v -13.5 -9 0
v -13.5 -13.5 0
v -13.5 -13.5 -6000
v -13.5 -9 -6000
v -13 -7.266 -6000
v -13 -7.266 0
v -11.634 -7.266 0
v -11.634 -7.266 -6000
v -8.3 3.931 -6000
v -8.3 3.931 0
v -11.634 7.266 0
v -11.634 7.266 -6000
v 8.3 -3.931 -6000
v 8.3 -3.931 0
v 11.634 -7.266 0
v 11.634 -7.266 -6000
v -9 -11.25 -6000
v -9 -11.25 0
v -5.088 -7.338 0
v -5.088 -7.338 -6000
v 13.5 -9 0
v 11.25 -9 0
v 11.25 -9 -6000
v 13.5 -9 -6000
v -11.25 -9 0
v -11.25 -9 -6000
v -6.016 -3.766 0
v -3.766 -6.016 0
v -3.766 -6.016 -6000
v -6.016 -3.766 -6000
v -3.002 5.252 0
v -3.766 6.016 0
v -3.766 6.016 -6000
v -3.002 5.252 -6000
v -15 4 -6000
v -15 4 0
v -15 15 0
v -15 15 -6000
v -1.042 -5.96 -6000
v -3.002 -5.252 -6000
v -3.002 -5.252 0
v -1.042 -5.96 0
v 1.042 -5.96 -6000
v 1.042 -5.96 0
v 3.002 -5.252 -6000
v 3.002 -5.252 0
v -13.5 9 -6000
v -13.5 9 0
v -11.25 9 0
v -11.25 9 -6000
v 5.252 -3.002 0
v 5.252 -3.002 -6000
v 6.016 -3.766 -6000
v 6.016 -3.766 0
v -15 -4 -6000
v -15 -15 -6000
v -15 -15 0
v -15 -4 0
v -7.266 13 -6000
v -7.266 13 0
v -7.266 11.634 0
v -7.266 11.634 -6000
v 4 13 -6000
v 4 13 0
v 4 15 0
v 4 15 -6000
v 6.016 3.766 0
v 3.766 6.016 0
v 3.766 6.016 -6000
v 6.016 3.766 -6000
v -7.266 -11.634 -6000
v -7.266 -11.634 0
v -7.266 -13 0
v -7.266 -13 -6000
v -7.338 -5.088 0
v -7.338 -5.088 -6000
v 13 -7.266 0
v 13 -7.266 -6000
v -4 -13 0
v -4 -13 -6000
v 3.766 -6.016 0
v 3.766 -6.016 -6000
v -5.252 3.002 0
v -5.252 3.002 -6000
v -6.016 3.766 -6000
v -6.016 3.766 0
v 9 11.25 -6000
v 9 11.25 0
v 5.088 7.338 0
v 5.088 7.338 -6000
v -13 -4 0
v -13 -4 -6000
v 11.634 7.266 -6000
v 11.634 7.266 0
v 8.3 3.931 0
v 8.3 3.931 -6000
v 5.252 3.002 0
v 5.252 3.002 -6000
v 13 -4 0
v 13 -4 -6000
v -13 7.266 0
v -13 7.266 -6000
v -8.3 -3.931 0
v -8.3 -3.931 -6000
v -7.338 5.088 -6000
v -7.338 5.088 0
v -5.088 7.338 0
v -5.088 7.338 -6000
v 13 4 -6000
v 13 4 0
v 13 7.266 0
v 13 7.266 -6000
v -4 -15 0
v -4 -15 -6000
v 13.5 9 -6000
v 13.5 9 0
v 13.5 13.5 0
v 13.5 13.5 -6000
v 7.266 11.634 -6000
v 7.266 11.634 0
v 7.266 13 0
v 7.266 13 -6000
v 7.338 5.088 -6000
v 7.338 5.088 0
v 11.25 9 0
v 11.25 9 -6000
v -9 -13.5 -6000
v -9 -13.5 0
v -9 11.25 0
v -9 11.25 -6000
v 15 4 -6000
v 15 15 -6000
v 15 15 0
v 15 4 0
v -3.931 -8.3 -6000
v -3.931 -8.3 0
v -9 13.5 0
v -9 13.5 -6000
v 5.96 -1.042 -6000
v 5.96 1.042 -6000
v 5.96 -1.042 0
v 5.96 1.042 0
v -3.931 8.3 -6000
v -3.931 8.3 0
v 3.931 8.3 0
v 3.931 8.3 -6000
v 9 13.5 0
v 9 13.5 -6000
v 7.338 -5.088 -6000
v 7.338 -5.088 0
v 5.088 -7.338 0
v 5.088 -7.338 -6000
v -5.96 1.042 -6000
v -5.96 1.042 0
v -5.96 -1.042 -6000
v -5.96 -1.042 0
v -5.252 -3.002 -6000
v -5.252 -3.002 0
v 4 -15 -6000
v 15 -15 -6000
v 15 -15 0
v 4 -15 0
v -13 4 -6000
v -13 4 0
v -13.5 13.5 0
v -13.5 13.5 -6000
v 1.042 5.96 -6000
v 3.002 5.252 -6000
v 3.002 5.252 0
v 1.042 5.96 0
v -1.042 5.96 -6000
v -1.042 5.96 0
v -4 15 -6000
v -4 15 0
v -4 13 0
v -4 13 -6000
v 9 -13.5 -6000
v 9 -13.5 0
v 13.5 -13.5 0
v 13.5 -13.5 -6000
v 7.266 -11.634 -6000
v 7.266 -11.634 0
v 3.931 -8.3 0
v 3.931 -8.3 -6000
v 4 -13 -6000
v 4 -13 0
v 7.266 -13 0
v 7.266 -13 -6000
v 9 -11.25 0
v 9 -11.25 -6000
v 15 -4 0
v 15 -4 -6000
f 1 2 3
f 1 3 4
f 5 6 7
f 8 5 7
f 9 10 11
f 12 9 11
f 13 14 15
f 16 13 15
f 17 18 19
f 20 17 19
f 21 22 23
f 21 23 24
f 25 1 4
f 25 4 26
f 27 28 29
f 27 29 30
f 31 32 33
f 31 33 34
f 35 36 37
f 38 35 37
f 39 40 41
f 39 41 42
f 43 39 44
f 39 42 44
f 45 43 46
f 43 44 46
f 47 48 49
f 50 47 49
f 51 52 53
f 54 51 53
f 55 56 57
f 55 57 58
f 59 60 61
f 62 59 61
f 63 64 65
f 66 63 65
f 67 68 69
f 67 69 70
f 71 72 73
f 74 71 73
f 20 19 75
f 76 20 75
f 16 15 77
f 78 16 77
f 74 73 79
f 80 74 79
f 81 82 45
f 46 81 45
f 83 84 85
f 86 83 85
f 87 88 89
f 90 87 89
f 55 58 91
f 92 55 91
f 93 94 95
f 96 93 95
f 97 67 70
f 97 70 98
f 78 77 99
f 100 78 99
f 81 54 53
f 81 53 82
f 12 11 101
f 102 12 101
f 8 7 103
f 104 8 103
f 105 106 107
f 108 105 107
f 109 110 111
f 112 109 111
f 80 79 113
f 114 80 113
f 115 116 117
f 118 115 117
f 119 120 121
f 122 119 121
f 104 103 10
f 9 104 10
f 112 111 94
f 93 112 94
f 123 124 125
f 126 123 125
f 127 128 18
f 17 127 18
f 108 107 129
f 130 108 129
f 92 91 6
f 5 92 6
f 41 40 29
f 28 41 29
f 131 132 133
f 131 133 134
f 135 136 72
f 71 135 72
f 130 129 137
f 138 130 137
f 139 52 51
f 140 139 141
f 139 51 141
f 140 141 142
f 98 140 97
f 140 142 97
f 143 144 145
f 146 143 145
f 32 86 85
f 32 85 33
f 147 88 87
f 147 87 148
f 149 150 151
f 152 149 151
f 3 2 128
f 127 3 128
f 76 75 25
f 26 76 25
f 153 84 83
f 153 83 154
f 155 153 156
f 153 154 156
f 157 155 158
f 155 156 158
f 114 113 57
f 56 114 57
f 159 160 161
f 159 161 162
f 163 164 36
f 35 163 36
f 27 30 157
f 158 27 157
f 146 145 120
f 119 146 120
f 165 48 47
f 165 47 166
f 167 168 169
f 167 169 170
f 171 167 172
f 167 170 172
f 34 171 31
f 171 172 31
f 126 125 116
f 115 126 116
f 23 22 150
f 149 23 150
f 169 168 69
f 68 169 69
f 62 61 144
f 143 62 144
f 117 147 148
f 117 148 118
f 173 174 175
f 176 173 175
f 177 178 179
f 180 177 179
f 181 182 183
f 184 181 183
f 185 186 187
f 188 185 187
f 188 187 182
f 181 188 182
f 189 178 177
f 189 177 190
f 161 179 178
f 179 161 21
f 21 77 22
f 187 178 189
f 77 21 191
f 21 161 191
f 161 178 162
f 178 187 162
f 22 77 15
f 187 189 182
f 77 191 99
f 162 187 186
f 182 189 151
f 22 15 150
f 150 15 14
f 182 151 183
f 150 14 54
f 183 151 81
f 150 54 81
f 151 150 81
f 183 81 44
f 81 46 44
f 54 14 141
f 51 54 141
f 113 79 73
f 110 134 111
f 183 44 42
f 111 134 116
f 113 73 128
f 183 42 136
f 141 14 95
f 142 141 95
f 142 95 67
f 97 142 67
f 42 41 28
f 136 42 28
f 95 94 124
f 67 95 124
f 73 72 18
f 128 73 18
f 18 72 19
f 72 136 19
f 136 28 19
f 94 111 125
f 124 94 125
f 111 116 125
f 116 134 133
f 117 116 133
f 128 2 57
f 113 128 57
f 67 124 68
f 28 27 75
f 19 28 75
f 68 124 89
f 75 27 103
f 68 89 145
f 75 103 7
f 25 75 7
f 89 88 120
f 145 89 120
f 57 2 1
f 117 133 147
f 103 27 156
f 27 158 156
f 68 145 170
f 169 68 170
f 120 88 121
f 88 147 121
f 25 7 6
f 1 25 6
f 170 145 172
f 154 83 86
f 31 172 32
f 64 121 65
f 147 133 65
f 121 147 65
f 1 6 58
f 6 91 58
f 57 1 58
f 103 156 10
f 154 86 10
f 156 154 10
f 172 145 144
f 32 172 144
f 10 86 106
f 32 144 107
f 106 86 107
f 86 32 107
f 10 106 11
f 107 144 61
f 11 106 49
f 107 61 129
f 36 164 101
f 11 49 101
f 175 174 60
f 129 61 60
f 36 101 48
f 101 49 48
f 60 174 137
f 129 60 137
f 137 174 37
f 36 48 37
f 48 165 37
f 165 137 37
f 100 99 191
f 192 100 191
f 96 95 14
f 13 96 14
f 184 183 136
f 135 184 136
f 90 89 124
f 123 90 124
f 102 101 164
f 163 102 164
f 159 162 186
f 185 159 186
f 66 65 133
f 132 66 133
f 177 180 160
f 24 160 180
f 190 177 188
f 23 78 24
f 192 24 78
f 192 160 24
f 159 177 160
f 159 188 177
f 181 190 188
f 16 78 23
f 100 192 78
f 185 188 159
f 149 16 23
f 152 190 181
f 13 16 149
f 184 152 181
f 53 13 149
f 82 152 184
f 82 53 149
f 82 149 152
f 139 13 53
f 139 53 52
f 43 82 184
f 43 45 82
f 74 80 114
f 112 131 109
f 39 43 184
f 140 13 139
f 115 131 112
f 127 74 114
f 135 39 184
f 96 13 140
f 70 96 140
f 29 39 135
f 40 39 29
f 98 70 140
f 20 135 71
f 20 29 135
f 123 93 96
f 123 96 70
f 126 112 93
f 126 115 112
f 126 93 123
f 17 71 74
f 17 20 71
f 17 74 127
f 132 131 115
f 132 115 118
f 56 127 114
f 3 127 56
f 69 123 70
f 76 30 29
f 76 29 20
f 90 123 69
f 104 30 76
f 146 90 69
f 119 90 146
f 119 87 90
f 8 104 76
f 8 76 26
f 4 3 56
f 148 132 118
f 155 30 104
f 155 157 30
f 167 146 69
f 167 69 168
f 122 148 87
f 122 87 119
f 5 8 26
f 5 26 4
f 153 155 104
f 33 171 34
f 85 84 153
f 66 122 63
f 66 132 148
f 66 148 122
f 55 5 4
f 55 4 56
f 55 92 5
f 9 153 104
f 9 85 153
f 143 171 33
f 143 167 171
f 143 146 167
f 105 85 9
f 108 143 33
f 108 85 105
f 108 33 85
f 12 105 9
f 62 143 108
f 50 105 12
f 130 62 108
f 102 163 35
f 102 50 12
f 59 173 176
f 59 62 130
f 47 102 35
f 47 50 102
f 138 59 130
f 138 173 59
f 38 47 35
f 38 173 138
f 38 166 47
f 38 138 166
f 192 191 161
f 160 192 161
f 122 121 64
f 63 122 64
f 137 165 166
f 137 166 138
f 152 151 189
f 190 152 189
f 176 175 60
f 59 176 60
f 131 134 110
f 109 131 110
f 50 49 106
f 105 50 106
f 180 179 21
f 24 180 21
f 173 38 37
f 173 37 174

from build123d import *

# Parameters (mm, degrees)
SKETCH_B02_1_R     = 6.05
SKETCH_B02_1_W     = 4.5
SKETCH_B02_1_H     = 4.5
EXTRUDE1_DEPTH     = 6000
CUT_EXTRUDE1_DEPTH = 6001
CIRPATTERN1_COUNT  = 4
CUT_EXTRUDE2_DEPTH = 6001
CIRPATTERN2_COUNT  = 4


with BuildPart() as part:
    # Sketch B02-1 → Extrude1 (new body)
    with BuildSketch(Plane.XY):
        Polygon((-13, -7.265685), (-11.634315, -7.265685), (-8.3, -3.931371213), (-8.3, 3.931371213), (-11.634315, 7.265685), (-13, 7.265685), (-13, 4), (-15, 4), (-15, 15), (-4, 15), (-4, 13), (-7.265685, 13), (-7.265685, 11.634315), (-3.931371213, 8.3), (3.931371213, 8.3), (7.265685, 11.634315), (7.265685, 13), (4, 13), (4, 15), (15, 15), (15, 4), (13, 4), (13, 7.265685), (11.634315, 7.265685), (8.3, 3.931371213), (8.3, -3.931371213), (11.634315, -7.265685), (13, -7.265685), (13, -4), (15, -4), (15, -15), (4, -15), (4, -13), (7.265685, -13), (7.265685, -11.634315), (3.931371213, -8.3), (-3.931371213, -8.3), (-7.265685, -11.634315), (-7.265685, -13), (-4, -13), (-4, -15), (-15, -15), (-15, -4), (-13, -4), align=None)
        Circle(SKETCH_B02_1_R, mode=Mode.SUBTRACT)
        with Locations((-11.25, -11.25)):
            Rectangle(SKETCH_B02_1_W, SKETCH_B02_1_H, mode=Mode.SUBTRACT)
        with Locations((-11.25, 11.25)):
            Rectangle(SKETCH_B02_1_W, SKETCH_B02_1_H, mode=Mode.SUBTRACT)
        with Locations((11.25, -11.25)):
            Rectangle(SKETCH_B02_1_W, SKETCH_B02_1_H, mode=Mode.SUBTRACT)
        with Locations((11.25, 11.25)):
            Rectangle(SKETCH_B02_1_W, SKETCH_B02_1_H, mode=Mode.SUBTRACT)
    extrude(amount=-EXTRUDE1_DEPTH)

    # Sketch1 → Cut-Extrude1 (cut, through all)
    with BuildSketch(Plane.XY):
        Polygon((-11.25, 9), (-7.338420268, 5.088420268), (-5.088420268, 7.338420268), (-9, 11.25), align=None)
    cut_extrude1 = extrude(amount=-CUT_EXTRUDE1_DEPTH, mode=Mode.SUBTRACT)

    # CirPattern1: Cut-Extrude1 ×4 about axis
    cirpattern1_axis = Axis((0, 0, 0), (0, 0, 1))
    for i in range(1, CIRPATTERN1_COUNT):
        add(cut_extrude1.rotate(cirpattern1_axis, i * 360 / CIRPATTERN1_COUNT), mode=Mode.SUBTRACT)

    # Sketch2 → Cut-Extrude2 (cut, through all)
    with BuildSketch(Plane.XY):
        Polygon((-4.706074285, 2.456074285), (-6.01620443, 3.76620443), (-3.76620443, 6.01620443), (-2.456074285, 4.706074285), align=None)
    cut_extrude2 = extrude(amount=-CUT_EXTRUDE2_DEPTH, mode=Mode.SUBTRACT)

    # CirPattern2: Cut-Extrude2 ×4 about axis
    cirpattern2_axis = Axis((0, 0, 0), (0, 0, 1))
    for i in range(1, CIRPATTERN2_COUNT):
        add(cut_extrude2.rotate(cirpattern2_axis, i * 360 / CIRPATTERN2_COUNT), mode=Mode.SUBTRACT)


solid = part.part
